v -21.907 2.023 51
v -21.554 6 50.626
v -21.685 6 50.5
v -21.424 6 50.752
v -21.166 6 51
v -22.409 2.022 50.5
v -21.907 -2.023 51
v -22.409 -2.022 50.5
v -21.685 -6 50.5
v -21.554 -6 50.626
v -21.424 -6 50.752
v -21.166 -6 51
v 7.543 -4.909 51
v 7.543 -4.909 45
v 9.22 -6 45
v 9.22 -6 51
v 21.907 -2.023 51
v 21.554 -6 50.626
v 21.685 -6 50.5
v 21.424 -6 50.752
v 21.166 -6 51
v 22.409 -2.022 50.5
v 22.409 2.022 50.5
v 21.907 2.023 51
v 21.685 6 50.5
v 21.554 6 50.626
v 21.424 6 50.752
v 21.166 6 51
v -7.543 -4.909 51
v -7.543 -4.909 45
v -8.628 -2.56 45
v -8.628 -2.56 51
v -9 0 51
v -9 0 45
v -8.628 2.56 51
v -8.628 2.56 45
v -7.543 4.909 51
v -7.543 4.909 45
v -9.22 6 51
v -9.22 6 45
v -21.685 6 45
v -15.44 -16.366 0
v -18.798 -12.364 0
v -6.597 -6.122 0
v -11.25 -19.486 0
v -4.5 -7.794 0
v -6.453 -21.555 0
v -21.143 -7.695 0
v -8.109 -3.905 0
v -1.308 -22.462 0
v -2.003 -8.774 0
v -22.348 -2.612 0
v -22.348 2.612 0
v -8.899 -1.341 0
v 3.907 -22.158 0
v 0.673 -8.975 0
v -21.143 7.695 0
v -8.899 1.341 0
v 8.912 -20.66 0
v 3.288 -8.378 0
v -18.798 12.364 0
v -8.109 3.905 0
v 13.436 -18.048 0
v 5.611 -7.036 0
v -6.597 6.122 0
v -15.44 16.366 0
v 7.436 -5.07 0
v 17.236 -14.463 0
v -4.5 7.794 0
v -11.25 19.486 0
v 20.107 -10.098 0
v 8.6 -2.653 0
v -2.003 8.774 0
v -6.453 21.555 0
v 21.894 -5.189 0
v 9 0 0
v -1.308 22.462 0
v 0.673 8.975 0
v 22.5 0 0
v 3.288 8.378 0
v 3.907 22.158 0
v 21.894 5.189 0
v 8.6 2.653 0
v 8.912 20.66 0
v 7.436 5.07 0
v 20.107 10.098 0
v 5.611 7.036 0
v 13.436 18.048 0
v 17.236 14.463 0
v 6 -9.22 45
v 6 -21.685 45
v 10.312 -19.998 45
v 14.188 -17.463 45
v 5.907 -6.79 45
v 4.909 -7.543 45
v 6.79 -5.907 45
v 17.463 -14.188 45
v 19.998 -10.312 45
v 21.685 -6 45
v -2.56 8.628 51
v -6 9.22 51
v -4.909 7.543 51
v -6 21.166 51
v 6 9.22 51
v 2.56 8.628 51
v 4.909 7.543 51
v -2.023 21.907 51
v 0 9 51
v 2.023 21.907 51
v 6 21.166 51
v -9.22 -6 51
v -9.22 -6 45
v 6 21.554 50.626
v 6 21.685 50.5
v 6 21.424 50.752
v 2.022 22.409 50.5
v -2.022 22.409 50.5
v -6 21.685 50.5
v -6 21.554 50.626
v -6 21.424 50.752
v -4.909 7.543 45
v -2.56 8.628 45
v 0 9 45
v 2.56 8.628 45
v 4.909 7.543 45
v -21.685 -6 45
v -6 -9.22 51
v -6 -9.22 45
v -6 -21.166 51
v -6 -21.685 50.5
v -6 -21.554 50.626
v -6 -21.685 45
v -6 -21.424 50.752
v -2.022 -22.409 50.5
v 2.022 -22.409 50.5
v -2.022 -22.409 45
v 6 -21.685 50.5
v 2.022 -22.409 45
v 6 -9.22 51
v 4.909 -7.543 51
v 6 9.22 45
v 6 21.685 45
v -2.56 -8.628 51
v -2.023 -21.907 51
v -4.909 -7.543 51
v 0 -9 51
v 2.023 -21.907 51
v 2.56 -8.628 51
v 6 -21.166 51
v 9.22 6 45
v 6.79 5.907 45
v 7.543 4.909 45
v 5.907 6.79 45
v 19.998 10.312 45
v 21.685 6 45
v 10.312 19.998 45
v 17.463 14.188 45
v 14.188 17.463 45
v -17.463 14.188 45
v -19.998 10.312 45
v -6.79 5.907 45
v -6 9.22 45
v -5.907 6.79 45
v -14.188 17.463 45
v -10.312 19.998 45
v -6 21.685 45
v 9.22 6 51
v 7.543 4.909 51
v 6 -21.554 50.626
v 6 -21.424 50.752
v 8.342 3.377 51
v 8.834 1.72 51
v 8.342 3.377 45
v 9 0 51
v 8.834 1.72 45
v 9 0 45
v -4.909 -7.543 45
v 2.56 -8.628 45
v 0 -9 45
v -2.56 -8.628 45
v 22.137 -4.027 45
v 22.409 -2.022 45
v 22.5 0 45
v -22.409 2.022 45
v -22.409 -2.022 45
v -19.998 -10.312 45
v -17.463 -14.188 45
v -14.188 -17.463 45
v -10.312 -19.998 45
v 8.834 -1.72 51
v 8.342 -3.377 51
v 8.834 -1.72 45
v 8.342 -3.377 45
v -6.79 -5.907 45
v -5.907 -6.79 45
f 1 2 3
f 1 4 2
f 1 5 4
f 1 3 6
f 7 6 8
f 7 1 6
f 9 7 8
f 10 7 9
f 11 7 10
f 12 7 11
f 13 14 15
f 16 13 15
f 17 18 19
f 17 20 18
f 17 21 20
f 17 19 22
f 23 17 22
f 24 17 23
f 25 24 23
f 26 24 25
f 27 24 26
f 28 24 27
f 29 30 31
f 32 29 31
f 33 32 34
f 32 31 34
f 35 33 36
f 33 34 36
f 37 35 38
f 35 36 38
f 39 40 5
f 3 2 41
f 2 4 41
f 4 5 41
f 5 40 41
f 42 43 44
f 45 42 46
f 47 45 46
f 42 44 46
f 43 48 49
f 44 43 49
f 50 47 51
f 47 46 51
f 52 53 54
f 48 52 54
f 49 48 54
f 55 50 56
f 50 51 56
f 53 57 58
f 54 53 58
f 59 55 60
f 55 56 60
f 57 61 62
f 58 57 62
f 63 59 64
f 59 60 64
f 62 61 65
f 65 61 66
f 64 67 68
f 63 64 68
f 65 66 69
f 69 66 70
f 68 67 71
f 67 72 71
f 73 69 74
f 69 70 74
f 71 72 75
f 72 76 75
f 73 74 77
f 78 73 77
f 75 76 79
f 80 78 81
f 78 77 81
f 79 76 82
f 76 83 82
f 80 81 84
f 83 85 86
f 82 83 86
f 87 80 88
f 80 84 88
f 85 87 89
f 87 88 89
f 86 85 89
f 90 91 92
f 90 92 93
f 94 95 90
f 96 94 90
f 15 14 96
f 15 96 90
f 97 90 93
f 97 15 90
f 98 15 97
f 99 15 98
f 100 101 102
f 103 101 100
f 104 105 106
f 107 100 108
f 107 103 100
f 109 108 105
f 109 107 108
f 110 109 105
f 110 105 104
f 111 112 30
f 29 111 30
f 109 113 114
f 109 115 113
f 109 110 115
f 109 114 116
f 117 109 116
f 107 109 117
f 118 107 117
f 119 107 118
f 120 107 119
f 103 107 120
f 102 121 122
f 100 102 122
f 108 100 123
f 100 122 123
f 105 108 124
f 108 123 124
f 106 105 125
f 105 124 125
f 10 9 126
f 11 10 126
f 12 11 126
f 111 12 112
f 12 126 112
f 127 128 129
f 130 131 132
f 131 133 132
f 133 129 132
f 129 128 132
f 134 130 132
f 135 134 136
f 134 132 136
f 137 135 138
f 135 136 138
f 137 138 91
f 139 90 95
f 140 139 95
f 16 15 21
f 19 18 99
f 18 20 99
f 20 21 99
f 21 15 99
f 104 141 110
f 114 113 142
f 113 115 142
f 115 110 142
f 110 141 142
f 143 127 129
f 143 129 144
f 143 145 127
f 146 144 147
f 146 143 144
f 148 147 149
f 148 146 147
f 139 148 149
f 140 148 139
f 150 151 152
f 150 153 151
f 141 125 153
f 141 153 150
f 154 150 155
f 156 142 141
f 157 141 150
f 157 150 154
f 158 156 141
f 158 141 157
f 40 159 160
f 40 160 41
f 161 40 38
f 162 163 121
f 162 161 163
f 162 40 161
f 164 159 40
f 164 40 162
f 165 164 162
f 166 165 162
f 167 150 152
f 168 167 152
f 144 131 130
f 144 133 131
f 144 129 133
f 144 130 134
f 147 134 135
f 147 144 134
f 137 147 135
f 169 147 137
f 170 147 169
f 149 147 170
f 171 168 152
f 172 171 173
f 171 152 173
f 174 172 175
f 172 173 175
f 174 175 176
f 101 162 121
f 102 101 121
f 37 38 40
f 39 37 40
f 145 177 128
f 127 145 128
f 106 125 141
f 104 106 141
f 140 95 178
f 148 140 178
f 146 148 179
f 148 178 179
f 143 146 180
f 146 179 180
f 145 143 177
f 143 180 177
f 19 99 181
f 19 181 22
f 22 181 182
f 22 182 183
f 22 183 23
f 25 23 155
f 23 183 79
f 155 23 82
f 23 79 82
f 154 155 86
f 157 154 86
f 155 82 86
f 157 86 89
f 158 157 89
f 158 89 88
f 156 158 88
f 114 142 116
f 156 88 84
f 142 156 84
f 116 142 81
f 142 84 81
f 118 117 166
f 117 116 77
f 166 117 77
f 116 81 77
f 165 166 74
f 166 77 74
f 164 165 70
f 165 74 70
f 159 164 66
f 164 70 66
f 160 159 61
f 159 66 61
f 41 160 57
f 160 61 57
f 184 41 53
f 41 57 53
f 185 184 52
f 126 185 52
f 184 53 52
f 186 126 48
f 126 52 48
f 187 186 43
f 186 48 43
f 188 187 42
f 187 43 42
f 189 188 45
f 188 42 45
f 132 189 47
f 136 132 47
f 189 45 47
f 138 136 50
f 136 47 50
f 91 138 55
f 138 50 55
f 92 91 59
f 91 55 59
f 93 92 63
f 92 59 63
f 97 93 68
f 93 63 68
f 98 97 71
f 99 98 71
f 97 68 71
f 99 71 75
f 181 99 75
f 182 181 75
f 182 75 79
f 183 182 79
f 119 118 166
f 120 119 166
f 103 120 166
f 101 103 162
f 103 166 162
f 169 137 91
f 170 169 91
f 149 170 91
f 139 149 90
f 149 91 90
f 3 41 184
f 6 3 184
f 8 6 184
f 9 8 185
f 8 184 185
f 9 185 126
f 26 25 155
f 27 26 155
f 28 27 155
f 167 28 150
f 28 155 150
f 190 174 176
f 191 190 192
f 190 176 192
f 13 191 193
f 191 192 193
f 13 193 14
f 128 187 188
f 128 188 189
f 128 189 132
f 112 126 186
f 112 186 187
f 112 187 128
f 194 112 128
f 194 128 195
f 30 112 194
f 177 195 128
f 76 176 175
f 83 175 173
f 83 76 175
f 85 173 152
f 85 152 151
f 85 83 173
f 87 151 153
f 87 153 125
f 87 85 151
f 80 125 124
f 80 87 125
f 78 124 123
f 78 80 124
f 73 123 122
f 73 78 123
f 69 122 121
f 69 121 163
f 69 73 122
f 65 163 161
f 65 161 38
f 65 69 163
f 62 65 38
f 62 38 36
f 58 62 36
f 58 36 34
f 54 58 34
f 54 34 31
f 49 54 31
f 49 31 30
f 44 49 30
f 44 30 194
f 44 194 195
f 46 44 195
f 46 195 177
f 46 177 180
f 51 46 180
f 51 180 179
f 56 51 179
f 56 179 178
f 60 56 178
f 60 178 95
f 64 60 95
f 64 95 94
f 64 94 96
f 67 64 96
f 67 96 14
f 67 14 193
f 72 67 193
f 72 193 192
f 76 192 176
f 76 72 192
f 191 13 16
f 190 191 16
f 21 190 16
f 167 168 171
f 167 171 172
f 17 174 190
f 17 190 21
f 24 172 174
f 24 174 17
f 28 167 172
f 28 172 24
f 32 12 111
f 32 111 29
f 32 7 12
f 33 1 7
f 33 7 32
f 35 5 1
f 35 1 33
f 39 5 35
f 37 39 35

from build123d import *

# Parameters (mm, degrees)
F0_R     = 22.5
F0_R_2   = 9
F1_DEPTH = 45
F3_DEPTH = 6
F4_SIZE  = 0.5


# Not quite as in the source:
# - after a boolean that leaves OpenCascade's solid faulty, fix() repairs it


with BuildPart() as f1:
    # F0 (on Top) → F1 (new body)
    with BuildSketch(Plane.XY):
        Circle(F0_R)
        Circle(F0_R_2, mode=Mode.SUBTRACT)
    extrude(amount=F1_DEPTH)

    # F2 (on face) → F3 (join)
    with BuildSketch(Plane.XY.offset(45)):
        with BuildLine():
            ThreePointArc((-21.6852484422, 6), (-22.5, 0), (-21.6852484422, -6))
            Line((-21.6852484422, -6), (-9.2195444573, -6))
            Line((-9.2195444573, -6), (-7.5432636469, -4.9090909091))
            ThreePointArc((-7.5432636469, -4.9090909091), (-9, 0), (-7.5432636469, 4.9090909091))
            Line((-7.5432636469, 4.9090909091), (-9.2195444573, 6))
            Line((-9.2195444573, 6), (-21.6852484422, 6))
        make_face()
        with BuildLine():
            ThreePointArc((6, 21.6852484422), (0, 22.5), (-6, 21.6852484422))
            Line((-6, 21.6852484422), (-6, 9.2195444573))
            Line((-6, 9.2195444573), (-4.9090909091, 7.5432636469))
            ThreePointArc((-4.9090909091, 7.5432636469), (0, 9), (4.9090909091, 7.5432636469))
            Line((4.9090909091, 7.5432636469), (6, 9.2195444573))
            Line((6, 9.2195444573), (6, 21.6852484422))
        make_face()
        with BuildLine():
            Line((9.2195444573, -6), (21.6852484422, -6))
            ThreePointArc((21.6852484422, -6), (22.2953816961, -3.0275328281), (22.5, 0))
            ThreePointArc((22.5, 0), (22.2953816961, 3.0275328281), (21.6852484422, 6))
            Line((21.6852484422, 6), (9.2195444573, 6))
            Line((9.2195444573, 6), (7.5432636469, 4.9090909091))
            ThreePointArc((7.5432636469, 4.9090909091), (8.6281334257, 2.5603346635), (9, 0))
            ThreePointArc((9, 0), (8.6281334257, -2.5603346635), (7.5432636469, -4.9090909091))
            Line((7.5432636469, -4.9090909091), (9.2195444573, -6))
        make_face()
        with BuildLine():
            Line((-6, -9.2195444573), (-6, -21.6852484422))
            ThreePointArc((-6, -21.6852484422), (0, -22.5), (6, -21.6852484422))
            Line((6, -21.6852484422), (6, -9.2195444573))
            Line((6, -9.2195444573), (4.9090909091, -7.5432636469))
            ThreePointArc((4.9090909091, -7.5432636469), (0, -9), (-4.9090909091, -7.5432636469))
            Line((-4.9090909091, -7.5432636469), (-6, -9.2195444573))
        make_face()
    extrude(amount=F3_DEPTH)

    add(f1.part.fix(), mode=Mode.REPLACE)

    # F4
    f4_edges = [f1.edges().sort_by_distance(p)[0] for p in [
        (-22.5, 0, 51),
        (0, 22.5, 51),
        (22.5, 0, 51),
        (0, -22.5, 51),
    ]]
    chamfer(f4_edges, length=F4_SIZE)


solid = f1.part
